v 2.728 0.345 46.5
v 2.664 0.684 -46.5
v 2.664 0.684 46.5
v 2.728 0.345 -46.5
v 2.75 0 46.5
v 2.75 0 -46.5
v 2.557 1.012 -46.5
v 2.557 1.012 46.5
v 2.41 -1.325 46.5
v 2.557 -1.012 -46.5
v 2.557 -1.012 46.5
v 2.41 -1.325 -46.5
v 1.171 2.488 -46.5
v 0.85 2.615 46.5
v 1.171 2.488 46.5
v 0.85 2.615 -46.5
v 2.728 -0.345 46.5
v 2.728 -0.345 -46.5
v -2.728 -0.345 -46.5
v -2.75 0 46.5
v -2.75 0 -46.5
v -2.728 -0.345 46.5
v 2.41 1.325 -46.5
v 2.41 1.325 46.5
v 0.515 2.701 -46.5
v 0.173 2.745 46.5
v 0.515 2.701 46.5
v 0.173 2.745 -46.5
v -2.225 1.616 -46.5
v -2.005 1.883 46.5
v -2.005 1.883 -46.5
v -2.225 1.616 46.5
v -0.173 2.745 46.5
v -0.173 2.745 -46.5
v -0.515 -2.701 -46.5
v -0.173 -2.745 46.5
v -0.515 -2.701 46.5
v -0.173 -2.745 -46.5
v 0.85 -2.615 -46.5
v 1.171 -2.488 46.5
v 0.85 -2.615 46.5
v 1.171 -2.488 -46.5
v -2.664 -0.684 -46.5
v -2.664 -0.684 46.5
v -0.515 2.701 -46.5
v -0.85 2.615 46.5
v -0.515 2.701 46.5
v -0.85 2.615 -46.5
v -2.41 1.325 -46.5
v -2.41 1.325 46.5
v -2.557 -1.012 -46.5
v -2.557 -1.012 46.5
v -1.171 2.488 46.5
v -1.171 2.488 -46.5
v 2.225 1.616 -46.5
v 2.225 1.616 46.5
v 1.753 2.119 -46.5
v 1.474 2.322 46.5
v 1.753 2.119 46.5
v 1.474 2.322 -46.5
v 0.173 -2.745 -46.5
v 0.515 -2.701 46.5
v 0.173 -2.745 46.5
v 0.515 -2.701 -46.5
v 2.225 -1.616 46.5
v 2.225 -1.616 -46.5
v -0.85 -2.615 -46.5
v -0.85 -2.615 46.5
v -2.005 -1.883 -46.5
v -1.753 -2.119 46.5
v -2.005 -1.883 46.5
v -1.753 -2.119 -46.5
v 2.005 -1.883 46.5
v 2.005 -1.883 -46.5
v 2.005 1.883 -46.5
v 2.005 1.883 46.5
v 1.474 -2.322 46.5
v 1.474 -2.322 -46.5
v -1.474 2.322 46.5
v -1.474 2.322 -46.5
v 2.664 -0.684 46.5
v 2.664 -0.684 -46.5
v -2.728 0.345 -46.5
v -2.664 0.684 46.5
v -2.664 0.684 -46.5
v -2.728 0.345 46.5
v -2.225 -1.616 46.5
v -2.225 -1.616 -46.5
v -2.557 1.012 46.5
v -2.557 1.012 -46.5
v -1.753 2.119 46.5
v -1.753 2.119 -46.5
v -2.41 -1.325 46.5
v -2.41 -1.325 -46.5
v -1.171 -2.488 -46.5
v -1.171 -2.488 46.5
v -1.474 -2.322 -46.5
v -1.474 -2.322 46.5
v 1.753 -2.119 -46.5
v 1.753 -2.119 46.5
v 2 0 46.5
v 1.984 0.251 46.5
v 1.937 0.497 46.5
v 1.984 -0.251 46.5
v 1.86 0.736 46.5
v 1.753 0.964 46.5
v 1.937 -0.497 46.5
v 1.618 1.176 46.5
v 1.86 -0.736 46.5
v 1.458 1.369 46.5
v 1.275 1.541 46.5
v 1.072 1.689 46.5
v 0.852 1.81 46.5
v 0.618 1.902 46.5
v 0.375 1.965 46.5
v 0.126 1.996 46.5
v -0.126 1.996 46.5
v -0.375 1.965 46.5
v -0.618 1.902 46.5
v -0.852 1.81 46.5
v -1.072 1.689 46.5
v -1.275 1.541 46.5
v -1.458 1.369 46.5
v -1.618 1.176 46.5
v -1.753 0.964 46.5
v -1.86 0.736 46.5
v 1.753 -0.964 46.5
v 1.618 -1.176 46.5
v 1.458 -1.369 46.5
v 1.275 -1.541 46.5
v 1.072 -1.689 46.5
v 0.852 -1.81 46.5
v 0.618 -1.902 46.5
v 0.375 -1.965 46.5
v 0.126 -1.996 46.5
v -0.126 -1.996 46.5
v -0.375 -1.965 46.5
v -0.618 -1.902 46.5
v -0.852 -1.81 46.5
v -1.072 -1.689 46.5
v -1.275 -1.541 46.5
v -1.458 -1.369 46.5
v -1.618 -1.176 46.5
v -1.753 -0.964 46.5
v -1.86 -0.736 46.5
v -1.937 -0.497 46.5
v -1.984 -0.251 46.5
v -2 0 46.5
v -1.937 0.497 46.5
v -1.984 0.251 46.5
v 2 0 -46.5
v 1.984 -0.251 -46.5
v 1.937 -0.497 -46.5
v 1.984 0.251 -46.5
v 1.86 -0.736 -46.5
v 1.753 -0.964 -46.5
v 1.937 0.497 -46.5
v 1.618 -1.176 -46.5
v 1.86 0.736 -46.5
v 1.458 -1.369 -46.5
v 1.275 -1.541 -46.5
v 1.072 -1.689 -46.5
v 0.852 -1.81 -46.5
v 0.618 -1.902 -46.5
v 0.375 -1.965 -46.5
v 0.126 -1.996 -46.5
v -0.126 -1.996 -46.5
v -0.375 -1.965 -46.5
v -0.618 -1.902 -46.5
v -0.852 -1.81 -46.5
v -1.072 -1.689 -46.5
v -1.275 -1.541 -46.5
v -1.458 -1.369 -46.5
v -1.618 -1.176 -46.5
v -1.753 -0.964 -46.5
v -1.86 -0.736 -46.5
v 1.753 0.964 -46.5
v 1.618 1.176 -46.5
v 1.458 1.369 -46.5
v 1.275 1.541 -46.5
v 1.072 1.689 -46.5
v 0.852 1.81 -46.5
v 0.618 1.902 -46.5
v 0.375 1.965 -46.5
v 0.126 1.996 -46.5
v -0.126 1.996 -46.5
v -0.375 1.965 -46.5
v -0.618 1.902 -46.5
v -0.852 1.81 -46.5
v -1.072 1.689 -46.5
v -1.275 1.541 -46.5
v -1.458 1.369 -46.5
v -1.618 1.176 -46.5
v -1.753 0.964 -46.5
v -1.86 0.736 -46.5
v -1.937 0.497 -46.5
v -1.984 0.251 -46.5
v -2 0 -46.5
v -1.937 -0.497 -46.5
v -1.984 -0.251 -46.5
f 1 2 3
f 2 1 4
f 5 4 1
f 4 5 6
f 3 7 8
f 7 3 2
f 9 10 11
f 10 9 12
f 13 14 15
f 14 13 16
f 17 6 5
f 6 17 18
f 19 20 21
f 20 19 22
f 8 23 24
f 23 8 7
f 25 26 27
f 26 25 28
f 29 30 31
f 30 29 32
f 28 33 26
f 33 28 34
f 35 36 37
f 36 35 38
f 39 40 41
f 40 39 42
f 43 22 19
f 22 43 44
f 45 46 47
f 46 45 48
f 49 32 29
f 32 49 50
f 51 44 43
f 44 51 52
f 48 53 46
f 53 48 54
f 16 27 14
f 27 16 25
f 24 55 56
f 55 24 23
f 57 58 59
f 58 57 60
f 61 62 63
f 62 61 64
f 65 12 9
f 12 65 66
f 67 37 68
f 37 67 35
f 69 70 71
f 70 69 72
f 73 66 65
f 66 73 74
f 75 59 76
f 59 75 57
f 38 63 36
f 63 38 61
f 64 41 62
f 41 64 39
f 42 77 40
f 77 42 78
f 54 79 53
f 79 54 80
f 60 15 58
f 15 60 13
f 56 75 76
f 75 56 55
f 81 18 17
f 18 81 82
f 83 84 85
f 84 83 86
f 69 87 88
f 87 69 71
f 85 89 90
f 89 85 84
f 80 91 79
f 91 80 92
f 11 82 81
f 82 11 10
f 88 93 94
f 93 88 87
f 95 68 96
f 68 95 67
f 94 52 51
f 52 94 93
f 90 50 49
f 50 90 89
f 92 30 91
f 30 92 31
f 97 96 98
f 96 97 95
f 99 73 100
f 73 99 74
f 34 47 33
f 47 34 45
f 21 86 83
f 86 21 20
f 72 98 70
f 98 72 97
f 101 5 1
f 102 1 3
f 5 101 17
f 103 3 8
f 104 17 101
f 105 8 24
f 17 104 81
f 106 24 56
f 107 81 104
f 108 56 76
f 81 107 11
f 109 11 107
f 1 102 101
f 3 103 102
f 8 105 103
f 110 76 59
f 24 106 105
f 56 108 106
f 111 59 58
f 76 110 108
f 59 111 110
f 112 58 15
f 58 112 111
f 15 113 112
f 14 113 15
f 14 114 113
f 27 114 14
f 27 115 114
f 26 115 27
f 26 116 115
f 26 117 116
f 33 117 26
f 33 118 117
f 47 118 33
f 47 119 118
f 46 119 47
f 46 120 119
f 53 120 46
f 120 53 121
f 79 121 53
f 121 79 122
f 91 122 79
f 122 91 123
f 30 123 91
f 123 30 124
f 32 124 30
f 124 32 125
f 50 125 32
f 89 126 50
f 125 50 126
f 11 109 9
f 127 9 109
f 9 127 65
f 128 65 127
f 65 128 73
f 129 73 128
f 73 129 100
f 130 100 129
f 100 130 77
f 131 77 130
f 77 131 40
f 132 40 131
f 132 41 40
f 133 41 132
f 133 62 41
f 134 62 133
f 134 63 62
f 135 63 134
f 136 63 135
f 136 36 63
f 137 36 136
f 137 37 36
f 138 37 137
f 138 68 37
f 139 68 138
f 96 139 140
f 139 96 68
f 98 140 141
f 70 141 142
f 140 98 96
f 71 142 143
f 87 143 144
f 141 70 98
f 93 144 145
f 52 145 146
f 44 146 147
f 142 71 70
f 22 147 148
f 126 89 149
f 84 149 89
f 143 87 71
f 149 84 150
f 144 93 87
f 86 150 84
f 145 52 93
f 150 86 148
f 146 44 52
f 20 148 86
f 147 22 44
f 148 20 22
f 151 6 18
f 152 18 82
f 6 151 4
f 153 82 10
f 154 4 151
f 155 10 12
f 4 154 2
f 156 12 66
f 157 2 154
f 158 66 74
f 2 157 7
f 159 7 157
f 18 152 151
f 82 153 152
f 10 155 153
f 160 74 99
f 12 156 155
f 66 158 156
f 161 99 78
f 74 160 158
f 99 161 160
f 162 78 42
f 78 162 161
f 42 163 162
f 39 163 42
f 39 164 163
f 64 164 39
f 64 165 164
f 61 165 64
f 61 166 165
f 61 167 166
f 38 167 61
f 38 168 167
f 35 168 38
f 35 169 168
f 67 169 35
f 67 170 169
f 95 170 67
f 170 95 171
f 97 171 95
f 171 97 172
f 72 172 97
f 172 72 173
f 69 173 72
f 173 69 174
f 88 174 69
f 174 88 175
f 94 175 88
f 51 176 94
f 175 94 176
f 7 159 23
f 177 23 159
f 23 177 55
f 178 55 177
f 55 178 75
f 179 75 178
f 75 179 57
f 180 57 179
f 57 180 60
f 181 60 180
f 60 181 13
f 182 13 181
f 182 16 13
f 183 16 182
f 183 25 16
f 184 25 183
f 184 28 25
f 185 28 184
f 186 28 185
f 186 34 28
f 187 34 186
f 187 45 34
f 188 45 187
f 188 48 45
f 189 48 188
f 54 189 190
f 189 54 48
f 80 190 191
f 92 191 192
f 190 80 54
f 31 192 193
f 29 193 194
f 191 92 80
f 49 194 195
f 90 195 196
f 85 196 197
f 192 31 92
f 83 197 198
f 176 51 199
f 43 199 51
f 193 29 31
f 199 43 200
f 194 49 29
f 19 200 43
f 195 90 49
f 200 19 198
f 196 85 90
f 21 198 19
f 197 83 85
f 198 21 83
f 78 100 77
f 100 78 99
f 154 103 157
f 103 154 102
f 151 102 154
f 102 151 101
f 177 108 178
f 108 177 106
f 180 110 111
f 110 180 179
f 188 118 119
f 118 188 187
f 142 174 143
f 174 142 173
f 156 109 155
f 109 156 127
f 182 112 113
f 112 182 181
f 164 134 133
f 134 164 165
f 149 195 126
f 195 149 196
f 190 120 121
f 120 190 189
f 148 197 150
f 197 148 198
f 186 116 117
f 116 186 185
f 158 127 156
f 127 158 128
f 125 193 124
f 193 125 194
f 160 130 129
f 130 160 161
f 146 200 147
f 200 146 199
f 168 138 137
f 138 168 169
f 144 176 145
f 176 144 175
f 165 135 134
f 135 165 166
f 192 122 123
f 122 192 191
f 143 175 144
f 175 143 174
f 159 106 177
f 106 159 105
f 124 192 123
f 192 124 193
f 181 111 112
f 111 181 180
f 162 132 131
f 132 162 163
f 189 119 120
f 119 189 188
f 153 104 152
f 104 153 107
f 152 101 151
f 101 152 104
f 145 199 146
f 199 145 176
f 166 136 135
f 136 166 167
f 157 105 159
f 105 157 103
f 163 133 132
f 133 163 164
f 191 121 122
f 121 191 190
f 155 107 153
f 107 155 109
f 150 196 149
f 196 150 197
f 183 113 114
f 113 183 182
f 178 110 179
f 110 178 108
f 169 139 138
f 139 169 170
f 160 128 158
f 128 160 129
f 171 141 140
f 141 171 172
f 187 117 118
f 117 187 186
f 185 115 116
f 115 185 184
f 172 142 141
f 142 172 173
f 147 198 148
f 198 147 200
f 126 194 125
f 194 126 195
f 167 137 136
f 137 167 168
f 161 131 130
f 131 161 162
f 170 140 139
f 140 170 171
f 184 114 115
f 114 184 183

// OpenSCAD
$fn = 50;


difference() {
	union() {
		translate(v = [0, 0, -46.5000000000]) {
			cylinder(h = 93, r = 2.7500000000);
		}
	}
	union() {
		translate(v = [0, 0, -100.0000000000]) {
			cylinder(h = 200, r = 2.0000000000);
		}
	}
}
